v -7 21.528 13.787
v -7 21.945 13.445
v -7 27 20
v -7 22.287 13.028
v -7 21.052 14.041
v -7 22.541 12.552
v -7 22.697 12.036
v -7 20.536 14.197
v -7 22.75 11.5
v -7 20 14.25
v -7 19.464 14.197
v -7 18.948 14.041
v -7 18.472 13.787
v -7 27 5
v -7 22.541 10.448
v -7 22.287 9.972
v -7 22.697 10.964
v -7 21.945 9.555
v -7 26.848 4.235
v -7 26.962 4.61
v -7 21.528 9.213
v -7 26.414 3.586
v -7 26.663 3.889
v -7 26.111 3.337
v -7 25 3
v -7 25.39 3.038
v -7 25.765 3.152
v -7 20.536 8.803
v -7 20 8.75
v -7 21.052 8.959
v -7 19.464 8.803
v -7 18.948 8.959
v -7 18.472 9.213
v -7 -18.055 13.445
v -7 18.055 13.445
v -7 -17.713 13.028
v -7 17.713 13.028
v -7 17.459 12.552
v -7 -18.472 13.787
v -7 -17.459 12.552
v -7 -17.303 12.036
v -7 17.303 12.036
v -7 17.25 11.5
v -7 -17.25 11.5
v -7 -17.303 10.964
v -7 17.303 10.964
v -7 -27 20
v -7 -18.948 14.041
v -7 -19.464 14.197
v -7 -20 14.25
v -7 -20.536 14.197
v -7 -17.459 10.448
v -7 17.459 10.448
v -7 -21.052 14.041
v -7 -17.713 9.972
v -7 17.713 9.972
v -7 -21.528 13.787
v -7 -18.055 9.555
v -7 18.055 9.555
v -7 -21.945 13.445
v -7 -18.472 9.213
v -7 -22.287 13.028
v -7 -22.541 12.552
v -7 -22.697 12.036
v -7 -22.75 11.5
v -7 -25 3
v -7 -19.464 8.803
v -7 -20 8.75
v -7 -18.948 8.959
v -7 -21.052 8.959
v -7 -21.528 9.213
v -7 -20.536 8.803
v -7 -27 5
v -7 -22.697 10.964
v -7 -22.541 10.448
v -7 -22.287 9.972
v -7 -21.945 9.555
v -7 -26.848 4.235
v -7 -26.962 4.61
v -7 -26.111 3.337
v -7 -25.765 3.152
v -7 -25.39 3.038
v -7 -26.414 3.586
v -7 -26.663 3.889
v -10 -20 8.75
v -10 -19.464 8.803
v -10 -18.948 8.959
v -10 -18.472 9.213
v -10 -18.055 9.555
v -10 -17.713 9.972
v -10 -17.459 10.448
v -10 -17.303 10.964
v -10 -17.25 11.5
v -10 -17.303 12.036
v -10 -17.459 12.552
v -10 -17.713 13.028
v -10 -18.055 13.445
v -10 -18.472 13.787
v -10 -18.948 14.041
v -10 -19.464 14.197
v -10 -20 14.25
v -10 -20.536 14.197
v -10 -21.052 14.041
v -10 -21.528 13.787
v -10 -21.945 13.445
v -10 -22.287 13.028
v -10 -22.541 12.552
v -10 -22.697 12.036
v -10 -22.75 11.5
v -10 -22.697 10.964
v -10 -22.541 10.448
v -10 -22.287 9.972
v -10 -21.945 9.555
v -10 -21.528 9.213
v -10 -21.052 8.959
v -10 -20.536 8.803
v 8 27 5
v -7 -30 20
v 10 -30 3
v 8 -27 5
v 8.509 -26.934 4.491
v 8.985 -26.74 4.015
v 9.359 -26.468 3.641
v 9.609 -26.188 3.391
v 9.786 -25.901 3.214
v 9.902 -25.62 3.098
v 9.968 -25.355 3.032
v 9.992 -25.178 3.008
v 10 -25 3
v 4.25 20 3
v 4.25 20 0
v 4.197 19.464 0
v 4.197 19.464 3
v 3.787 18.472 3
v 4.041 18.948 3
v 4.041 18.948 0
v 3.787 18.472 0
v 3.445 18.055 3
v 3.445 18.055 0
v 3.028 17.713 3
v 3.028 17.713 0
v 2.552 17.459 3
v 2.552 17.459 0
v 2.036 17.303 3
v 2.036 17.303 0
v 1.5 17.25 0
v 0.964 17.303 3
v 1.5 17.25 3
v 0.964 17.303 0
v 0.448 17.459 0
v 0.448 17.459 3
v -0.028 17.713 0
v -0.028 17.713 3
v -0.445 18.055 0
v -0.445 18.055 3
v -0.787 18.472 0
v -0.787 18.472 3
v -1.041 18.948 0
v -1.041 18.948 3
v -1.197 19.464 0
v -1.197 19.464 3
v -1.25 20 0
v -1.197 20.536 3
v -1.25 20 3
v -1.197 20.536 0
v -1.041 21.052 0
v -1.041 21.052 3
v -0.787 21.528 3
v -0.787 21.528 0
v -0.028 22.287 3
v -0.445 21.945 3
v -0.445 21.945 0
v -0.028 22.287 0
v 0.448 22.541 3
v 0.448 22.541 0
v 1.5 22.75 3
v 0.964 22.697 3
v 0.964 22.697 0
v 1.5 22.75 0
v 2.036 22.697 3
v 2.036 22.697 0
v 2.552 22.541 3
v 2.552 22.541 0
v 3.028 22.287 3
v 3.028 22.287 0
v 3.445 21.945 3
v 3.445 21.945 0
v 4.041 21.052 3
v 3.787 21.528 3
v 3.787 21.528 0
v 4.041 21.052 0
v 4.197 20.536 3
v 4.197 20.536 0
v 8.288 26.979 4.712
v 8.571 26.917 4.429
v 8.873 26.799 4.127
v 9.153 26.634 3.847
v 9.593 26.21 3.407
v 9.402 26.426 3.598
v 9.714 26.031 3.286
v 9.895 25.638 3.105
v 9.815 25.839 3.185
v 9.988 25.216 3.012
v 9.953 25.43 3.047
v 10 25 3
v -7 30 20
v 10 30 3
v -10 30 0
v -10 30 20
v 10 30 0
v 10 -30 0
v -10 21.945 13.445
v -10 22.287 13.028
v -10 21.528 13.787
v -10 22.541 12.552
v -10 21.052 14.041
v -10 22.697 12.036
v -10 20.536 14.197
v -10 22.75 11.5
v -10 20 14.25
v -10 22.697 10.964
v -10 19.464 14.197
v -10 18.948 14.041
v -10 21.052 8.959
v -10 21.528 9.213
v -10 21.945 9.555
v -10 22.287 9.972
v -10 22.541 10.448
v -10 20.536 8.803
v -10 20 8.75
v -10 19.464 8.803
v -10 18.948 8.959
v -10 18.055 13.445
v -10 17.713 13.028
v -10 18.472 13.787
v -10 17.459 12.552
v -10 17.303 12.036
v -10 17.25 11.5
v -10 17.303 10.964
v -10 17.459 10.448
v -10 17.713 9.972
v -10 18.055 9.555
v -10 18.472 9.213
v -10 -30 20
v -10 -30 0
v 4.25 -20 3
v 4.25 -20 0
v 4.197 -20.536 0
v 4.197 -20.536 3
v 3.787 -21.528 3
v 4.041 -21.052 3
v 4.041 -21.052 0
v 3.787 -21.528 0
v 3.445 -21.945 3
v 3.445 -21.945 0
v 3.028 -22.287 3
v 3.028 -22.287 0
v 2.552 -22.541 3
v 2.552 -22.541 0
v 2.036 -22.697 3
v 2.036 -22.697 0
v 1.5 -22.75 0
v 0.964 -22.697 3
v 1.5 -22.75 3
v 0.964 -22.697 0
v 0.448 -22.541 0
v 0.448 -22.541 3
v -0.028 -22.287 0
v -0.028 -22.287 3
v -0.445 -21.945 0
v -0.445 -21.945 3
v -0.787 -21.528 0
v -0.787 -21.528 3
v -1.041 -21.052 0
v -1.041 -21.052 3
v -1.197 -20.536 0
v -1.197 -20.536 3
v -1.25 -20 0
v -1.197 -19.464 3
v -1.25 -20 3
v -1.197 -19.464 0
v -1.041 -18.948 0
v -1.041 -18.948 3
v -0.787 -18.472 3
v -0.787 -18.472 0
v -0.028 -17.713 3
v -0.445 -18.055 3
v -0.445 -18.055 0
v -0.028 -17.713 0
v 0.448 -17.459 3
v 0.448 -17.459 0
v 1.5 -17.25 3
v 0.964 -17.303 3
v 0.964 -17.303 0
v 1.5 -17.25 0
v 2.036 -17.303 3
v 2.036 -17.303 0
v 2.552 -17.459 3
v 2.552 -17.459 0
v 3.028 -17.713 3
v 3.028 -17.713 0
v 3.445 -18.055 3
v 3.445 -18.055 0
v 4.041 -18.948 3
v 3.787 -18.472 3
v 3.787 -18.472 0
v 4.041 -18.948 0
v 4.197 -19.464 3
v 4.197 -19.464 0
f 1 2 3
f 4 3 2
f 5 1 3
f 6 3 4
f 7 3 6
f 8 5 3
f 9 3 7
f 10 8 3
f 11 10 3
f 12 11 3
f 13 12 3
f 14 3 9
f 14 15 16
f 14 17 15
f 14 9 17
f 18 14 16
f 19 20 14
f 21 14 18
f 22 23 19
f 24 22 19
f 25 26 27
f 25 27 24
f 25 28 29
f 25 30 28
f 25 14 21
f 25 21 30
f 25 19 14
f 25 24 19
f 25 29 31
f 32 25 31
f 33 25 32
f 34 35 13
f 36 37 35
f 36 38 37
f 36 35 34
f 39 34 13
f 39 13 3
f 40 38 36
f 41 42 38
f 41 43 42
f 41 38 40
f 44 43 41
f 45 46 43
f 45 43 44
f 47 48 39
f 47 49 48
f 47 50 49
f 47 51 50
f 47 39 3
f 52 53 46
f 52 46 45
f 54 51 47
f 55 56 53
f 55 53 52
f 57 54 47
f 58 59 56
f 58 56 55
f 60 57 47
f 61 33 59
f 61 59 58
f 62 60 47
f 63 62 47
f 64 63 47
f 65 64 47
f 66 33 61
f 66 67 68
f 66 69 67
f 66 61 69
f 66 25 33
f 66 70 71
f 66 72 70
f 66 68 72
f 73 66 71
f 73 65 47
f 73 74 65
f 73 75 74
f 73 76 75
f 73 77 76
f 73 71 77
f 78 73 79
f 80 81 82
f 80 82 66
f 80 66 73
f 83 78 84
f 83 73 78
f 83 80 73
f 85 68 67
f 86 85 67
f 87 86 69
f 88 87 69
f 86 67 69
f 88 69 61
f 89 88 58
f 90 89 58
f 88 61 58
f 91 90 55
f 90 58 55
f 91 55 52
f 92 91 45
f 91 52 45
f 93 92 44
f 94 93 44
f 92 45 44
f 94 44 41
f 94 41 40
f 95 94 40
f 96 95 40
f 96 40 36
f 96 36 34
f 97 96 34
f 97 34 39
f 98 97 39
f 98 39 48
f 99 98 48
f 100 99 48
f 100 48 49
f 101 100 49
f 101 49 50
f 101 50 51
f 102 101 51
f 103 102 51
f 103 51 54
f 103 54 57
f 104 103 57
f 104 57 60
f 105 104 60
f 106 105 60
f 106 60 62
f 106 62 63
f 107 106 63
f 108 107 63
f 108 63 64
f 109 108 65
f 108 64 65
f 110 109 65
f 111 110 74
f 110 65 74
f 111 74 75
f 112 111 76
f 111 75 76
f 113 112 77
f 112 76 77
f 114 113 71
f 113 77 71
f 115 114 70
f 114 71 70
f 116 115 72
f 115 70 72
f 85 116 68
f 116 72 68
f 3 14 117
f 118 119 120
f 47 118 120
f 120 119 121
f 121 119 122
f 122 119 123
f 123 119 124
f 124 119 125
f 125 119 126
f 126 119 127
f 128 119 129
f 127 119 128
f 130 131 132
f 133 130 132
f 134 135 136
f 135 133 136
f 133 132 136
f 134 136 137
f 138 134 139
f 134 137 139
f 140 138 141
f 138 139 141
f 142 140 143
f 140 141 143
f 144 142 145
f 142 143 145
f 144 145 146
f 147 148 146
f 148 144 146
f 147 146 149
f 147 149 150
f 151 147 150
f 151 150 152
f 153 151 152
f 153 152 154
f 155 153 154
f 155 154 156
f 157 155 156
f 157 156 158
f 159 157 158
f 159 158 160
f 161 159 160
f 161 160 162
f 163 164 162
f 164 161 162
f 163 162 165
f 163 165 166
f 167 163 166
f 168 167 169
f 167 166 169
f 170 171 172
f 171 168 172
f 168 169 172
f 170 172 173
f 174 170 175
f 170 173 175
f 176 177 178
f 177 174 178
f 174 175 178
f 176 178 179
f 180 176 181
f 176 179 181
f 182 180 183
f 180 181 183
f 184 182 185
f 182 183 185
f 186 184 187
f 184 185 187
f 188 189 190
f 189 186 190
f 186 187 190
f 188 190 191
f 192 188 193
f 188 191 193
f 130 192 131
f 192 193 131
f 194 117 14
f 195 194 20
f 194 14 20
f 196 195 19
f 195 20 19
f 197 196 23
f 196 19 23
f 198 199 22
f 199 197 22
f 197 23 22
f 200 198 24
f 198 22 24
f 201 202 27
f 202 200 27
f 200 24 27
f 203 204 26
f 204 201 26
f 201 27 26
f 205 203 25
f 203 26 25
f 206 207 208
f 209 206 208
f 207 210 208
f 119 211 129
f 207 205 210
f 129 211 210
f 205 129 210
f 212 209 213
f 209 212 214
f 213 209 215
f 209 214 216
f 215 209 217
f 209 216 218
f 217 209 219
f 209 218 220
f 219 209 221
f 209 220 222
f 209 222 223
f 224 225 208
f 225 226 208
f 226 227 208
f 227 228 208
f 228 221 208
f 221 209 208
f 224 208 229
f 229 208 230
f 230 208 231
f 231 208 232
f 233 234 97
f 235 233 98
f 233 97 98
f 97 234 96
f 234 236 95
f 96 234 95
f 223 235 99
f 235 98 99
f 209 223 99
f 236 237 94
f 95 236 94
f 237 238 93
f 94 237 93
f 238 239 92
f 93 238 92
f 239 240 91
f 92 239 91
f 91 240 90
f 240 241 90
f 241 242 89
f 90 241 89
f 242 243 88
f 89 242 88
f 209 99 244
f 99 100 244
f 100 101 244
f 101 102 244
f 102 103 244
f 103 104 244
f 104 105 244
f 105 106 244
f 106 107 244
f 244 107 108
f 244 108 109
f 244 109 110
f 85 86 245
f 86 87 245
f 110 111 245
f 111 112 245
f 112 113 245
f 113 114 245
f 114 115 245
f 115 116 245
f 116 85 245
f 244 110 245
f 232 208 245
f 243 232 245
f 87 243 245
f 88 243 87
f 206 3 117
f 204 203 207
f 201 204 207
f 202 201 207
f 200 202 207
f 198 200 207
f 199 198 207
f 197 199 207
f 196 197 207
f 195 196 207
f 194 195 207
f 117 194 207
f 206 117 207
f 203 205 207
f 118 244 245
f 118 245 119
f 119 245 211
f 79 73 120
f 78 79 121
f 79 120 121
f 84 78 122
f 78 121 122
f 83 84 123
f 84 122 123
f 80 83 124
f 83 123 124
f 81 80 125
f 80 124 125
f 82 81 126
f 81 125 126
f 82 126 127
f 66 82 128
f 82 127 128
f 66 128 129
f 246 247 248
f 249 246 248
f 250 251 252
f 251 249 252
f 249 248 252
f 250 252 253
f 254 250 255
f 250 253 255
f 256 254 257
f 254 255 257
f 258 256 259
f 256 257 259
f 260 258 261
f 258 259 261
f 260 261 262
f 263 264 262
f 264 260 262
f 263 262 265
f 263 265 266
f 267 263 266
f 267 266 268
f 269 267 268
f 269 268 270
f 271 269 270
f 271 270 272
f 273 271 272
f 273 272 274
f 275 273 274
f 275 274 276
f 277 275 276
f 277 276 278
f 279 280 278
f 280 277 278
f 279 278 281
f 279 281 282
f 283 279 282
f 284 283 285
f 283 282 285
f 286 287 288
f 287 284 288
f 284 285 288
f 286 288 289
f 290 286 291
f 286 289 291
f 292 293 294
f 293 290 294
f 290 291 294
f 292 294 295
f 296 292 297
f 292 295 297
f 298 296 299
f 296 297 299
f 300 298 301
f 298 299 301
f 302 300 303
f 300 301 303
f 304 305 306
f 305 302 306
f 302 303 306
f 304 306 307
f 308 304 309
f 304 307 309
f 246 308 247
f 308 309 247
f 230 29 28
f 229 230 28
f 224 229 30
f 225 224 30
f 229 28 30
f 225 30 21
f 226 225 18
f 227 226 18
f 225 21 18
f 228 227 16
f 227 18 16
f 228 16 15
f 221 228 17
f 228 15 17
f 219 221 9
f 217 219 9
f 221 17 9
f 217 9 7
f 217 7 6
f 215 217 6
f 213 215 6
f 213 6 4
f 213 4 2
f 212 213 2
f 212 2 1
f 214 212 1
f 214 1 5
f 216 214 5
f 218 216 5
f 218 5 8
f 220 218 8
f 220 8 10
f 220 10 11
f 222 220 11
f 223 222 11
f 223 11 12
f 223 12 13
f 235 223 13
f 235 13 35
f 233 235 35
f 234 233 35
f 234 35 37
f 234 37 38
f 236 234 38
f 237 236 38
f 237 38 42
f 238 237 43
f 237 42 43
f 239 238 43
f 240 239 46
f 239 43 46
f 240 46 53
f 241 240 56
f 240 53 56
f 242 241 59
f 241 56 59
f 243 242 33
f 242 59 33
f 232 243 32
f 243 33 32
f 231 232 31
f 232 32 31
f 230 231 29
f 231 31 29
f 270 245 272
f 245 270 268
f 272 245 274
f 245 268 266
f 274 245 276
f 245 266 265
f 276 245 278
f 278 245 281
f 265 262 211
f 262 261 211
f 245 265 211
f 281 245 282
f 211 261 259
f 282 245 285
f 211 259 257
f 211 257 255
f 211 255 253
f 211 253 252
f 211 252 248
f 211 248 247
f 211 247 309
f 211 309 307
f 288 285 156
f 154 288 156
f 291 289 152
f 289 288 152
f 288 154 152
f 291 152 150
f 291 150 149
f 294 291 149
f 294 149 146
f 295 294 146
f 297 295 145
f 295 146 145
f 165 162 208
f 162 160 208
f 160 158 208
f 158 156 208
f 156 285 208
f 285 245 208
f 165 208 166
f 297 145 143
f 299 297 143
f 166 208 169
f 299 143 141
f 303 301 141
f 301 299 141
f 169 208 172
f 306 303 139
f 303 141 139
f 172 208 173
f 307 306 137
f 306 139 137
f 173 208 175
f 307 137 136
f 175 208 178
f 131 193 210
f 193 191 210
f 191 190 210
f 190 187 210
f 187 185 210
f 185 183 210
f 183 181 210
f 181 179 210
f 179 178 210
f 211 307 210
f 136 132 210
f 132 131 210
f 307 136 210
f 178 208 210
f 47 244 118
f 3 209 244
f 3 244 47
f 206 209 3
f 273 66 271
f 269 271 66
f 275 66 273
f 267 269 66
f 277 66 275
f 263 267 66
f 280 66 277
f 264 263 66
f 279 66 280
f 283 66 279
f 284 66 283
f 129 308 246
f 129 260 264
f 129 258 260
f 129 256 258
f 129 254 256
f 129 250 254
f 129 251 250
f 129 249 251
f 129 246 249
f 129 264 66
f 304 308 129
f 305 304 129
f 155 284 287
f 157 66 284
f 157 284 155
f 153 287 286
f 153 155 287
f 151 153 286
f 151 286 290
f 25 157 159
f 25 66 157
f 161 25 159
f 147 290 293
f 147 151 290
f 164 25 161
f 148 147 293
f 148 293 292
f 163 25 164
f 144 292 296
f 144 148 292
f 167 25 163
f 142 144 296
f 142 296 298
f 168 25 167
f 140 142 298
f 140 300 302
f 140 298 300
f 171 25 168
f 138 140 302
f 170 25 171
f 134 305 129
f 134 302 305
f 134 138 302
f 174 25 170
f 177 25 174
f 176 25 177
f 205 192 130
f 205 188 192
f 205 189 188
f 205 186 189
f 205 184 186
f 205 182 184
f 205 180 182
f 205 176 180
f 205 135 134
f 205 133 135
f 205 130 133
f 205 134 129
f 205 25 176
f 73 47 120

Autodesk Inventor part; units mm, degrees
ref_plane "YZ Plane" through (0, 0, 0) normal (1, 0, 0) x (0, 1, 0)
ref_plane "XZ Plane" through (0, 0, 0) normal (0, 1, 0) x (-1, 0, 0)
ref_plane "XY Plane" through (0, 0, 0) normal (0, 0, 1) x (1, 0, 0)
sketch "Sketch1" plane through (0, 0, 0) normal (0, 0, 1) x (1, 0, 0)
  line L0 (-10, -30) -> (10, -30)
  line L1 (10, -30) -> (10, 30)
  line L2 (10, 30) -> (-10, 30)
  line L3 (-10, 30) -> (-10, -30)
  line L4 (-10, -30) -> (10, 30) construction
  line L5 (10, -30) -> (-10, 30) construction
  circle A0 centre (1.5, 20) radius 2.75
  circle A1 centre (1.5, -20) radius 2.75
  point P0 (0, 0)
  dimension "d0" = 20
  dimension "d1" = 60
  dimension "d20" = 5.5
  dimension "d21" = 5.5
  dimension "d22" = 10
  dimension "d23" = 8.5
  dimension "d24" = 8.5
  dimension "d25" = 10
extrude "Extrusion1" add sketch "Sketch1" along normal blind 3
sketch "Sketch2" plane through (0, 0, 3) normal (0, 0, 1) x (1, 0, 0)
  line L0 (10, 30) -> (-10, 30) projected
  line L1 (-10, 30) -> (-7, 30)
  line L2 (-7, 30) -> (-7, -30)
  line L3 (-7, -30) -> (-10, -30)
  line L4 (-10, -30) -> (-10, 30)
  point P0 (0, 0)
  dimension "d4" = 3
  dimension "d5" = 60
extrude "Extrusion2" add sketch "Sketch2" along normal blind 17
sketch "Sketch3" plane through (-10, 30, 0) normal (0, 1, 0) x (1, 0, 0)
  line L0 (0, 0) -> (20, 0)
  line L1 (20, 0) -> (20, -20)
  line L2 (20, -20) -> (0, -20)
  line L3 (0, -20) -> (0, 0)
  point P0 (10, 0)
  dimension "d8" = 20
  dimension "d9" = 20
extrude "Extrusion3" add sketch "Sketch3" against normal blind 3
sketch "Sketch4" plane through (-10, -30, 0) normal (0, -1, 0) x (1, 0, 0)
  line L0 (0, 0) -> (20, 0)
  line L1 (20, 0) -> (20, 20)
  line L2 (20, 20) -> (0, 20)
  line L3 (0, 20) -> (0, 0)
  point P0 (10, 0)
  dimension "d12" = 20
  dimension "d13" = 20
extrude "Extrusion4" add sketch "Sketch4" against normal blind 3
chamfer "Chamfer1" distance 17 angle 45 2 edges at (10, -28.5, 20) (10, 28.5, 20)
fillet "Fillet1" radius 2 2 edges at (1.5, 27, 3) (1.5, -27, 3)
sketch "Sketch5" plane through (-7, -27, 20) normal (1, 0, 0) x (0, 0, -1)
  circle A0 centre (8.5, 7) radius 2.75
  circle A1 centre (8.5, 47) radius 2.75
  line L0 (17, 57) -> (0, 57) projected
  line L1 (0, 0) -> (0, 54) projected
  line L2 (0, -3) -> (17, -3) projected
  point P0 (20, 27)
  dimension "d26" = 5.5
  dimension "d27" = 5.5
  dimension "d28" = 10
  dimension "d29" = 8.5
  dimension "d30" = 8.5
  dimension "d31" = 10
extrude "Extrusion5" cut sketch "Sketch5" against normal blind 3
properties part number "2060 Custom Bracing" material "Aluminum 6061"
